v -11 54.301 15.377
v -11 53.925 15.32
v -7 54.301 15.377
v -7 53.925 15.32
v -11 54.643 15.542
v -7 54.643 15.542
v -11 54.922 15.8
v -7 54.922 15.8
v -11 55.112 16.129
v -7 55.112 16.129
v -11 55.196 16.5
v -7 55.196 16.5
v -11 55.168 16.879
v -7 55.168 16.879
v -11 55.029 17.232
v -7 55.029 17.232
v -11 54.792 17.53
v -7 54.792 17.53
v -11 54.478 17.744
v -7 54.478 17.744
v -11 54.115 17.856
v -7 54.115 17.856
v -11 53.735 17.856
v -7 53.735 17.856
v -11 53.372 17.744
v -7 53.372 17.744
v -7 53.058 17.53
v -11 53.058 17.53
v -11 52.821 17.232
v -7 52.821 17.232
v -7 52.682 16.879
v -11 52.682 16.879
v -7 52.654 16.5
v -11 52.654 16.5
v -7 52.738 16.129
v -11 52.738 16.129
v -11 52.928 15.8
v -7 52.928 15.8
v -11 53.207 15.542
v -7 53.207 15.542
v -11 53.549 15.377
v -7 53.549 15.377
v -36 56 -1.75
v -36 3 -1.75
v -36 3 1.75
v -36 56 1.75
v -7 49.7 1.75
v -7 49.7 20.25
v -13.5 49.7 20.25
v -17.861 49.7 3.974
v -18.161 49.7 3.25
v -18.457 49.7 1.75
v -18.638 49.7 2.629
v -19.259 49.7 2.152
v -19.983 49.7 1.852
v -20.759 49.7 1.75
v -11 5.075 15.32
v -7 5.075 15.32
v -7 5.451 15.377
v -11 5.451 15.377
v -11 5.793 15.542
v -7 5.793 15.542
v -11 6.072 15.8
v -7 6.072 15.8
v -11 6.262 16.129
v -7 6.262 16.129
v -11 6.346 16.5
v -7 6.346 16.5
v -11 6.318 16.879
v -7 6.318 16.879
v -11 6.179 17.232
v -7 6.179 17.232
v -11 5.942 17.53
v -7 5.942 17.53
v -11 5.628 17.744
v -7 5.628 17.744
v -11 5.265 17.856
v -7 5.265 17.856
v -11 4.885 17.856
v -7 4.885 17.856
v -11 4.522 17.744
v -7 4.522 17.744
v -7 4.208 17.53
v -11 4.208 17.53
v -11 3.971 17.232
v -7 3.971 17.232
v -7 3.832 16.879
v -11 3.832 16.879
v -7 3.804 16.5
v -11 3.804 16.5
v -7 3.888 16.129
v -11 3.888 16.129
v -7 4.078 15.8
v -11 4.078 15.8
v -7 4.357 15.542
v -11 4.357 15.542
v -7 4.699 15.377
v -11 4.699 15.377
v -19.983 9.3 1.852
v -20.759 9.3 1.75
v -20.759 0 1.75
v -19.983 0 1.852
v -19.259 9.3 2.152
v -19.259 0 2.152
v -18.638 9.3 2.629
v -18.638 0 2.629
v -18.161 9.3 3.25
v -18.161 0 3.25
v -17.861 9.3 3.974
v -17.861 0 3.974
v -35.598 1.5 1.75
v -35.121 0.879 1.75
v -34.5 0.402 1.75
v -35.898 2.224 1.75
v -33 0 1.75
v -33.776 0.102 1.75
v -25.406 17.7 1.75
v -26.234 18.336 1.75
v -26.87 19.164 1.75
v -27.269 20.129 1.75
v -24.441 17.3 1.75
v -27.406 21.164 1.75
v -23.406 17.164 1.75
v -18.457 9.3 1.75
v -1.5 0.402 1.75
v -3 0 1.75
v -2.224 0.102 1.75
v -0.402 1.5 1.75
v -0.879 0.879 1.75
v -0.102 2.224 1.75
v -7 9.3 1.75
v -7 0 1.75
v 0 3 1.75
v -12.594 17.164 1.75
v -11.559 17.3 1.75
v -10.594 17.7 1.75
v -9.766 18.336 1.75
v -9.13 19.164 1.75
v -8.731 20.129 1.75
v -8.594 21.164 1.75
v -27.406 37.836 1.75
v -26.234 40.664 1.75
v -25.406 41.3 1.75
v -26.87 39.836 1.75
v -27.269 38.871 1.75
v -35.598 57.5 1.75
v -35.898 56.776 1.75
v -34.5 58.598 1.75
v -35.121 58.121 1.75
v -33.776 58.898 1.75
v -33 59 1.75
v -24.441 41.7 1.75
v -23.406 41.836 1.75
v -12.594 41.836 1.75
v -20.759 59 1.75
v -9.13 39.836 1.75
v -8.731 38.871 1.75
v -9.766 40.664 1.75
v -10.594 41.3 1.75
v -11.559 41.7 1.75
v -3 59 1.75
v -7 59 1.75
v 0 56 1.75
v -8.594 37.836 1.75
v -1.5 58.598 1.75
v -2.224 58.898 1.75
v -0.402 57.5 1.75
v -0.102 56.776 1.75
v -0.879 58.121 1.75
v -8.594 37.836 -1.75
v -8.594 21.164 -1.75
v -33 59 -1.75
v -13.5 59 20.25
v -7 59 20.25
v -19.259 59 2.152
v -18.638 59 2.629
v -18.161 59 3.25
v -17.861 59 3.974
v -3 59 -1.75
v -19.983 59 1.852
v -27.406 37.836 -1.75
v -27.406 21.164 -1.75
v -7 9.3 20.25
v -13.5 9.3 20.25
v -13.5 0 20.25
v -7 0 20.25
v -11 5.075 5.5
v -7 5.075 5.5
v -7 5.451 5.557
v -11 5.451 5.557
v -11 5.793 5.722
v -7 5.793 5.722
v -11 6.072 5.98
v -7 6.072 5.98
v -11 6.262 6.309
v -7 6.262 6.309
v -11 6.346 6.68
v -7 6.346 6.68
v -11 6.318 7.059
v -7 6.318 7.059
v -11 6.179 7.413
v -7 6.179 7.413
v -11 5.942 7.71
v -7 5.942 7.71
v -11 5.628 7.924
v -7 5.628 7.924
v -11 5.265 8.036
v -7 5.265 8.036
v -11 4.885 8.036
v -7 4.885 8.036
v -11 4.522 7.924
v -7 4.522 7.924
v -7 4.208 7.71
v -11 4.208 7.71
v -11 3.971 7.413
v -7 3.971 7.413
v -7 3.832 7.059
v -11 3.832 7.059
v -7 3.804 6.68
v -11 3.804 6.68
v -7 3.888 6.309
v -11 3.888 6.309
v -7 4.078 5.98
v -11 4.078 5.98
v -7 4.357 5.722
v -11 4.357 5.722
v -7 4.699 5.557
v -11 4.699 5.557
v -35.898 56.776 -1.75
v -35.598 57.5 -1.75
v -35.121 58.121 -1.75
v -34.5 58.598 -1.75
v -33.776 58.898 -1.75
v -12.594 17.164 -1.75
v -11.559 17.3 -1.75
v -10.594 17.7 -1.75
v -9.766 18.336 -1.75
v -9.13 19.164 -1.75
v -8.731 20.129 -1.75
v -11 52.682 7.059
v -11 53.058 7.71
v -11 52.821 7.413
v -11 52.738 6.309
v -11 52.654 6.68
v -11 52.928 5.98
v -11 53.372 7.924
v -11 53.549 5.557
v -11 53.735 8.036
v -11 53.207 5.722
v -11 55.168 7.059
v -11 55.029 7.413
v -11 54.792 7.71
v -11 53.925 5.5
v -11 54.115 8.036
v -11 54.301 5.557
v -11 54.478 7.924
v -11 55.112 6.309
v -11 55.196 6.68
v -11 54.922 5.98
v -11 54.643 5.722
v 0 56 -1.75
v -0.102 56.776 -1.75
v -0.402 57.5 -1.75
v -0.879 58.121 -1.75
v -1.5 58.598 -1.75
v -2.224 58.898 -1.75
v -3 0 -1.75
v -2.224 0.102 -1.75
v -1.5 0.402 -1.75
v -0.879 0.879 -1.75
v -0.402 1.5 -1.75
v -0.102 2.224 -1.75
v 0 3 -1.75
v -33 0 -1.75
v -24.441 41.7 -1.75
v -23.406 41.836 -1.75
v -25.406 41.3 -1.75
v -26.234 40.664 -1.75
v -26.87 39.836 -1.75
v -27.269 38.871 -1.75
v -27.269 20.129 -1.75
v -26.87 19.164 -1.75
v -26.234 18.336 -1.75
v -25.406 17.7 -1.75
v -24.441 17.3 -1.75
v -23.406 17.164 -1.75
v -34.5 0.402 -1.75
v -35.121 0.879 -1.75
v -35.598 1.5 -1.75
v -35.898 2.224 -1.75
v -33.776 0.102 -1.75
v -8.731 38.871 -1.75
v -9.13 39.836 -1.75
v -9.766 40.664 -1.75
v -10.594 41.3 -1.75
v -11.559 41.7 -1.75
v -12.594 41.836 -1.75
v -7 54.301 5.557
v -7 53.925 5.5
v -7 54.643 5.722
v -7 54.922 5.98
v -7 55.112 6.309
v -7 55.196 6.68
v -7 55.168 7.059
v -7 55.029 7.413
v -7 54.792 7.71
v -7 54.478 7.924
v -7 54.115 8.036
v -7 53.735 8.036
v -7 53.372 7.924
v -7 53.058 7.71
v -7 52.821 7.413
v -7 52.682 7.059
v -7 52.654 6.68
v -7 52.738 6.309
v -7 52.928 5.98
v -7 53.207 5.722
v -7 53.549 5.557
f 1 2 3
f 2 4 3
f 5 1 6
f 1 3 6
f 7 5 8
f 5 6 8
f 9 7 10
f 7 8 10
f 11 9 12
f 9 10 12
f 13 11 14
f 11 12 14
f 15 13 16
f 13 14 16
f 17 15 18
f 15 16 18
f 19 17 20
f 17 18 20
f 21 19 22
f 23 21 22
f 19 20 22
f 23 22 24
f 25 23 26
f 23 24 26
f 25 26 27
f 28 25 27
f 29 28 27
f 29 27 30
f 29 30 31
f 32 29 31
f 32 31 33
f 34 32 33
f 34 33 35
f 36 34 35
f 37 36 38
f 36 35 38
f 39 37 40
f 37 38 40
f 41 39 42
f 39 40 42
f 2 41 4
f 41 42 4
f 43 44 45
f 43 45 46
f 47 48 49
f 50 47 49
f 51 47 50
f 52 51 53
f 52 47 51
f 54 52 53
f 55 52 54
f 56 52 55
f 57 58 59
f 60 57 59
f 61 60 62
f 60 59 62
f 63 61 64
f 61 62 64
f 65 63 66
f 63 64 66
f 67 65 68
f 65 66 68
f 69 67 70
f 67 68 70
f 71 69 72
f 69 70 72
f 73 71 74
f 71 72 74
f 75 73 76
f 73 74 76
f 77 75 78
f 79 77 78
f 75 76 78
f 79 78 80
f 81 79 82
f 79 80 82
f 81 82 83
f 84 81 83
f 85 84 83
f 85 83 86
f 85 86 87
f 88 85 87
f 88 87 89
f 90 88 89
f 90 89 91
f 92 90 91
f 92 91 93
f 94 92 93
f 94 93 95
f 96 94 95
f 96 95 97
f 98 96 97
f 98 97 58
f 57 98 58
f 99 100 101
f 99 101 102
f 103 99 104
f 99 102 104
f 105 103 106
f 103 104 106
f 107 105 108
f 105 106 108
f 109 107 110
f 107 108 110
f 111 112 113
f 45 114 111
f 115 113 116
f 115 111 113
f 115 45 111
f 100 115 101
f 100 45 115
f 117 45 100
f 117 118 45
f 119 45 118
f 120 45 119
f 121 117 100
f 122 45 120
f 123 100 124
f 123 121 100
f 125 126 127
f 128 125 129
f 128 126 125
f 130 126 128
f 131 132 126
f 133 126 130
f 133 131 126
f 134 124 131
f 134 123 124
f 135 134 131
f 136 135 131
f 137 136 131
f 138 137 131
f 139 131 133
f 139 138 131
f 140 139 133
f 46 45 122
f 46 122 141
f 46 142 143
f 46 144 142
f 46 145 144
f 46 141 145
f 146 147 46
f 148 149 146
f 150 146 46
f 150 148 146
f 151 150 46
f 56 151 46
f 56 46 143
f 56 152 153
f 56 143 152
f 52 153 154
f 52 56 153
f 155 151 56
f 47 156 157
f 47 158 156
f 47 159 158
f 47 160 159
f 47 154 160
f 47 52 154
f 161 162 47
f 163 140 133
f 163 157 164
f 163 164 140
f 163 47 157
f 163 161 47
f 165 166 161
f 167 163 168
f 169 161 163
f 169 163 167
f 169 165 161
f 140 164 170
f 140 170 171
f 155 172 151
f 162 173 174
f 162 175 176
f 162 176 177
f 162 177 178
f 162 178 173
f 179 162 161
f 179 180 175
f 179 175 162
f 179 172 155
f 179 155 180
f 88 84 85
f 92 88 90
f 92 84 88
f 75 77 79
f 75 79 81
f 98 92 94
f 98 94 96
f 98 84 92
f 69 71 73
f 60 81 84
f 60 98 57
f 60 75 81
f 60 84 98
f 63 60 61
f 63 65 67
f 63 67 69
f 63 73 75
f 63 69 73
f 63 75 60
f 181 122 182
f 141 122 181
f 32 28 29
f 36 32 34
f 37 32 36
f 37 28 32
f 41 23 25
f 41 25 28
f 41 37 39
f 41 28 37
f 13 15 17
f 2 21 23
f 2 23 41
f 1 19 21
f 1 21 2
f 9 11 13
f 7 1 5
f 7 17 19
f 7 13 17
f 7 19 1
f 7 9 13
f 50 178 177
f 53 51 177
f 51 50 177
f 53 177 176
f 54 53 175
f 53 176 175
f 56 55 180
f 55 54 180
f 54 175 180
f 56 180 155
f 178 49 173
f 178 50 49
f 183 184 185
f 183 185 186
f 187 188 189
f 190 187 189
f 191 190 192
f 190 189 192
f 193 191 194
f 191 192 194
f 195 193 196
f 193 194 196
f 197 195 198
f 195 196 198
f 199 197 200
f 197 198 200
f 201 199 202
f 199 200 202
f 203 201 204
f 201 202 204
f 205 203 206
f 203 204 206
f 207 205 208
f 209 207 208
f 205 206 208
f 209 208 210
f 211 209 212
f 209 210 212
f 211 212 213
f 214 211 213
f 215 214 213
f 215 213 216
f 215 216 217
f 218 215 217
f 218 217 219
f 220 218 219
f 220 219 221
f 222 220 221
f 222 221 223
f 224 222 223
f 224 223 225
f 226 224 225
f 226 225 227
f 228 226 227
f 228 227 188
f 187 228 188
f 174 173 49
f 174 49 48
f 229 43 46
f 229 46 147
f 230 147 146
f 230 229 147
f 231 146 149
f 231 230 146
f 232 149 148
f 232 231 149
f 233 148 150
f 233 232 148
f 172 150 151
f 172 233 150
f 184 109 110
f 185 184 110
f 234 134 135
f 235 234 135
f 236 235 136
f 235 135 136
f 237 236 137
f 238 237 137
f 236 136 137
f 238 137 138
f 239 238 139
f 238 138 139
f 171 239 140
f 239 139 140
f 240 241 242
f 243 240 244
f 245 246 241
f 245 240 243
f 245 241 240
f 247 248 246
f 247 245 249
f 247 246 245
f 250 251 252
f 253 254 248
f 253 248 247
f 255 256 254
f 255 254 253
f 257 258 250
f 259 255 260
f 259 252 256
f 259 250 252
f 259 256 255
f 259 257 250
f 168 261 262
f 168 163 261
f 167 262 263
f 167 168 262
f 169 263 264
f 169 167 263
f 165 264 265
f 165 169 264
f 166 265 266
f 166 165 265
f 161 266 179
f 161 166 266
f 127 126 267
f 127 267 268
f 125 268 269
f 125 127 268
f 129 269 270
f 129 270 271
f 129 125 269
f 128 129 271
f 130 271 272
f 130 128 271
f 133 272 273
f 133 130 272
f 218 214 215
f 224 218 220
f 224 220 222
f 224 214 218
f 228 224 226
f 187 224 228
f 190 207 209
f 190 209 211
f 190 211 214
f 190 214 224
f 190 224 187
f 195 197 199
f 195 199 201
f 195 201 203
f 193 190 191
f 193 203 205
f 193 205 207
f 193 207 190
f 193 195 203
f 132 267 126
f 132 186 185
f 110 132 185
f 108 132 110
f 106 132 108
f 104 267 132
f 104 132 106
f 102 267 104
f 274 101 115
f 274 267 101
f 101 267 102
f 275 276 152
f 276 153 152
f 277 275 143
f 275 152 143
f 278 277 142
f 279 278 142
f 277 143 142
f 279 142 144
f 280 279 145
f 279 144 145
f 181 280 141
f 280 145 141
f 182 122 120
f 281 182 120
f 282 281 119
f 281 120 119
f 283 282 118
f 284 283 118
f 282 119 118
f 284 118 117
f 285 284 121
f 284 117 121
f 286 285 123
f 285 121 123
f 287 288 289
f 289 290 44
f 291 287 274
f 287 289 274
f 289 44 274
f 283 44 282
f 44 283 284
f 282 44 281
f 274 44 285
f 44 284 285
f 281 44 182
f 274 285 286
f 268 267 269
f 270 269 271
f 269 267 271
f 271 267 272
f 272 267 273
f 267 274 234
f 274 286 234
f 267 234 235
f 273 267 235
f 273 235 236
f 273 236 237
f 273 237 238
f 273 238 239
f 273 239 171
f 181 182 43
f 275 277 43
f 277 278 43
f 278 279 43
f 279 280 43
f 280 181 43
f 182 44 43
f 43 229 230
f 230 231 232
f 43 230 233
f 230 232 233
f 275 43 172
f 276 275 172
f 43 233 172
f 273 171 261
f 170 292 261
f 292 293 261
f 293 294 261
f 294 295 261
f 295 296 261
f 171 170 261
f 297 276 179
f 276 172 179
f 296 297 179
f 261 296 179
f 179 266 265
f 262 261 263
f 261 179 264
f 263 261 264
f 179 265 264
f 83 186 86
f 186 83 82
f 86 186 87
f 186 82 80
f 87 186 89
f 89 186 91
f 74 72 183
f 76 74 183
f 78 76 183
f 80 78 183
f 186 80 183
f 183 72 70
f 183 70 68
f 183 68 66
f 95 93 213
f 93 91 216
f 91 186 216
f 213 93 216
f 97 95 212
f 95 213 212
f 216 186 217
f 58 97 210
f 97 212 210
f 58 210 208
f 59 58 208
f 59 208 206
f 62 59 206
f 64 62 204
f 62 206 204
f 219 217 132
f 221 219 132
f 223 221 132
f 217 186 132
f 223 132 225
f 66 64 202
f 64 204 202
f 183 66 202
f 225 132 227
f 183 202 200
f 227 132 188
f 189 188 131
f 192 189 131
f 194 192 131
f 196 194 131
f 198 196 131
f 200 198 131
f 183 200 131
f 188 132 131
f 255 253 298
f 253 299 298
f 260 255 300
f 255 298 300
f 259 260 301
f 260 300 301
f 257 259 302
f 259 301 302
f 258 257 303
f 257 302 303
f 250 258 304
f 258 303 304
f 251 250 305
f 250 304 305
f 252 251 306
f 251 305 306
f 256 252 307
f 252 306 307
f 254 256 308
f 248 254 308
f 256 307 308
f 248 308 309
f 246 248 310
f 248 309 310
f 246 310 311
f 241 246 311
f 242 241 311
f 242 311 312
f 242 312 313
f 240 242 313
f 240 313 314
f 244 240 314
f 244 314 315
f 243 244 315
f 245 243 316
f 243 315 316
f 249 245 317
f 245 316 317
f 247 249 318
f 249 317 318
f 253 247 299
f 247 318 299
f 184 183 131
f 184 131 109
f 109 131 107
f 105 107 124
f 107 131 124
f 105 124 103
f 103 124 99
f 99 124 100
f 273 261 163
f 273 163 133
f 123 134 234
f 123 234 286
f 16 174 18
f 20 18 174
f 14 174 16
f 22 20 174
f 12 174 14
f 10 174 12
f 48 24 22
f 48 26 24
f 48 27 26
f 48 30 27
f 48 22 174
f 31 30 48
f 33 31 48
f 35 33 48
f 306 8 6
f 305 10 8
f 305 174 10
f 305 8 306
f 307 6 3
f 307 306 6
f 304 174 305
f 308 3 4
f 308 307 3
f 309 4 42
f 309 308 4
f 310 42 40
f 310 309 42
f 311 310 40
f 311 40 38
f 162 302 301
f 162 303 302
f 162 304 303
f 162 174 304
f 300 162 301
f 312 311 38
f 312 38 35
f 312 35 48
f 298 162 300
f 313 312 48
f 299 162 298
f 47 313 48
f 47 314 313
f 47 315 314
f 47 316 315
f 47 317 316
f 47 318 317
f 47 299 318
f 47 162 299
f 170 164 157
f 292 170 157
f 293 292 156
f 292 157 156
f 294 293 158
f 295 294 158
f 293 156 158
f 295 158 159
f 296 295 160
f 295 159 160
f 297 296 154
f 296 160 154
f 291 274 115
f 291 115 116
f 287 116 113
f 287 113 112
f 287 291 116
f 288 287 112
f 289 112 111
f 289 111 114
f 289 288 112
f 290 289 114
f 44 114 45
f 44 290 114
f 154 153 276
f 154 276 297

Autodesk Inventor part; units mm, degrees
ref_plane "YZ Plane" through (0, 0, 0) normal (1, 0, 0) x (0, 1, 0)
ref_plane "XZ Plane" through (0, 0, 0) normal (0, 1, 0) x (-1, 0, 0)
ref_plane "XY Plane" through (0, 0, 0) normal (0, 0, 1) x (1, 0, 0)
sketch "Base" plane through (0, 0, 0) normal (0, 0, 1) x (1, 0, 0)
  line L0 (0, 0) -> (-36, 0)
  line L1 (-36, 0) -> (-36, 59)
  line L2 (-36, 59) -> (0, 59)
  line L3 (0, 59) -> (0, 0)
  dimension "d0" = 36
  dimension "d1" = 59
extrude "Extrusion1" add sketch "Base" along normal mid plane 3.5
sketch "Attachment Towers" plane through (0, 0, 1.75) normal (0, 0, 1) x (1, 0, 0)
  line L0 (0, 29.5) -> (-7, 29.5) construction
  line L1 (-7, 29.5) -> (-7, 49.7) construction
  line L2 (-7, 29.5) -> (-7, 9.3) construction
  line L3 (-7, 49.7) -> (-13.5, 49.7)
  line L4 (-13.5, 49.7) -> (-13.5, 59)
  line L5 (-13.5, 59) -> (-7, 59)
  line L6 (-7, 59) -> (-7, 49.7)
  line L7 (-7, 9.3) -> (-13.5, 9.3)
  line L8 (-13.5, 9.3) -> (-13.5, 0)
  line L9 (-13.5, 0) -> (-7, 0)
  line L10 (-7, 0) -> (-7, 9.3)
  dimension "d41" = 7
  dimension "d44" = 40.4
  dimension "d45" = 6.5
  dimension "d46" = 9.3
extrude "Extrusion3" add sketch "Attachment Towers" along normal blind 18.5
sketch "Screw Holes" plane through (-7, 0, 1.75) normal (1, 0, 0) x (0, 0, -1)
  line L0 (0, 49.7) -> (0, 51.8) construction
  line L1 (0, 51.8) -> (-7.15, 51.8) construction
  circle A0 centre (-5.025, 53.925) radius 2.125 construction
  line L2 (-7.15, 51.8) -> (-7.15, 61.0367) construction
  line L3 (-2.9, 53.925) -> (-16.97, 53.925) construction
  circle A1 centre (-14.845, 53.925) radius 2.125 construction
  line L4 (-16.97, 51.8) -> (-16.97, 61.0367) construction
  circle A2 centre (-14.845, 53.925) radius 1.275
  circle A3 centre (-5.025, 53.925) radius 1.275
  line L5 (0, 29.5) -> (-35.6681, 29.5) construction
  circle A4 centre (-14.845, 5.075) radius 1.275
  circle A5 centre (-5.025, 5.075) radius 1.275
  dimension "d18" = 4.25
  dimension "d15" = 2.1
  dimension "d16" = 7.15
  dimension "d20" = 14.07
  dimension "d21" = 4.25
  dimension "d22" = 2.55
  dimension "d23" = 2.55
extrude "Extrusion4" cut sketch "Screw Holes" against normal blind 4
draft "FaceDraft1" angle 15 pull direction (0, 0, 1) faces at (-13.5, 6.2, 7.9167) (-13.5, 55.9, 7.9167) fixed edges at (-13.5, 4.65, 20.25) (-13.5, 54.35, 20.25)
sketch "Sketch5" plane through (0, 0, 1.75) normal (0, 0, 1) x (1, 0, 0)
  line L0 (-36, 29.5) -> (0, 29.5) construction
  line L1 (-23.4056, 41.836) -> (-12.5944, 41.836)
  line L2 (-8.5944, 37.836) -> (-8.5944, 21.164)
  line L3 (-12.5944, 17.164) -> (-23.4056, 17.164)
  line L4 (-27.4056, 21.164) -> (-27.4056, 37.836)
  line L5 (-27.4056, 41.836) -> (-8.5944, 17.164) construction
  line L6 (-8.5944, 41.836) -> (-27.4056, 17.164) construction
  arc A0 (-27.4056, 21.164) -> (-23.4056, 17.164) centre (-23.4056, 21.164) ccw
  arc A1 (-12.5944, 17.164) -> (-8.5944, 21.164) centre (-12.5944, 21.164) ccw
  arc A2 (-8.5944, 37.836) -> (-12.5944, 41.836) centre (-12.5944, 37.836) ccw
  arc A3 (-23.4056, 41.836) -> (-27.4056, 37.836) centre (-23.4056, 37.836) ccw
  point P0 (-18, 29.5)
  dimension "d47" = 4
extrude "Extrusion5" cut sketch "Sketch5" against normal through all
fillet "Fillet1" radius 3 6 edges at (0, 0, 0) (0, 59, 0) (-36, 59, 0) (-36, 0, 0) (-18.4571, 4.65, 1.75) (-18.4571, 54.35, 1.75)
sketch "Axle Reference" plane through (-7, 0, 1.75) normal (1, 0, 0) x (0, 0, -1)
  circle A0 centre (-14.845, 5.075) radius 1.275 construction
  circle A1 centre (-5.025, 5.075) radius 1.275 construction
  line L0 (-9.935, 5.075) -> (-9.935, 39.375) construction
  line L1 (-9.935, 53.925) -> (-9.935, 39.375) construction
  line L2 (-9.935, 39.375) -> (0, 39.375) construction
  line L3 (0, 56) -> (0, 3) construction
  circle A2 centre (-14.845, 5.075) radius 1.275 construction
  line L4 (-14.845, 5.075) -> (-5.025, 5.075) construction
  point P0 (1.75, 0)
  dimension "d48" = 34.3
  dimension "d49" = 14.55
  dimension "d50" = 9.935
  dimension "d51" = 9.82
properties part number "MG996R Attachment Test"
